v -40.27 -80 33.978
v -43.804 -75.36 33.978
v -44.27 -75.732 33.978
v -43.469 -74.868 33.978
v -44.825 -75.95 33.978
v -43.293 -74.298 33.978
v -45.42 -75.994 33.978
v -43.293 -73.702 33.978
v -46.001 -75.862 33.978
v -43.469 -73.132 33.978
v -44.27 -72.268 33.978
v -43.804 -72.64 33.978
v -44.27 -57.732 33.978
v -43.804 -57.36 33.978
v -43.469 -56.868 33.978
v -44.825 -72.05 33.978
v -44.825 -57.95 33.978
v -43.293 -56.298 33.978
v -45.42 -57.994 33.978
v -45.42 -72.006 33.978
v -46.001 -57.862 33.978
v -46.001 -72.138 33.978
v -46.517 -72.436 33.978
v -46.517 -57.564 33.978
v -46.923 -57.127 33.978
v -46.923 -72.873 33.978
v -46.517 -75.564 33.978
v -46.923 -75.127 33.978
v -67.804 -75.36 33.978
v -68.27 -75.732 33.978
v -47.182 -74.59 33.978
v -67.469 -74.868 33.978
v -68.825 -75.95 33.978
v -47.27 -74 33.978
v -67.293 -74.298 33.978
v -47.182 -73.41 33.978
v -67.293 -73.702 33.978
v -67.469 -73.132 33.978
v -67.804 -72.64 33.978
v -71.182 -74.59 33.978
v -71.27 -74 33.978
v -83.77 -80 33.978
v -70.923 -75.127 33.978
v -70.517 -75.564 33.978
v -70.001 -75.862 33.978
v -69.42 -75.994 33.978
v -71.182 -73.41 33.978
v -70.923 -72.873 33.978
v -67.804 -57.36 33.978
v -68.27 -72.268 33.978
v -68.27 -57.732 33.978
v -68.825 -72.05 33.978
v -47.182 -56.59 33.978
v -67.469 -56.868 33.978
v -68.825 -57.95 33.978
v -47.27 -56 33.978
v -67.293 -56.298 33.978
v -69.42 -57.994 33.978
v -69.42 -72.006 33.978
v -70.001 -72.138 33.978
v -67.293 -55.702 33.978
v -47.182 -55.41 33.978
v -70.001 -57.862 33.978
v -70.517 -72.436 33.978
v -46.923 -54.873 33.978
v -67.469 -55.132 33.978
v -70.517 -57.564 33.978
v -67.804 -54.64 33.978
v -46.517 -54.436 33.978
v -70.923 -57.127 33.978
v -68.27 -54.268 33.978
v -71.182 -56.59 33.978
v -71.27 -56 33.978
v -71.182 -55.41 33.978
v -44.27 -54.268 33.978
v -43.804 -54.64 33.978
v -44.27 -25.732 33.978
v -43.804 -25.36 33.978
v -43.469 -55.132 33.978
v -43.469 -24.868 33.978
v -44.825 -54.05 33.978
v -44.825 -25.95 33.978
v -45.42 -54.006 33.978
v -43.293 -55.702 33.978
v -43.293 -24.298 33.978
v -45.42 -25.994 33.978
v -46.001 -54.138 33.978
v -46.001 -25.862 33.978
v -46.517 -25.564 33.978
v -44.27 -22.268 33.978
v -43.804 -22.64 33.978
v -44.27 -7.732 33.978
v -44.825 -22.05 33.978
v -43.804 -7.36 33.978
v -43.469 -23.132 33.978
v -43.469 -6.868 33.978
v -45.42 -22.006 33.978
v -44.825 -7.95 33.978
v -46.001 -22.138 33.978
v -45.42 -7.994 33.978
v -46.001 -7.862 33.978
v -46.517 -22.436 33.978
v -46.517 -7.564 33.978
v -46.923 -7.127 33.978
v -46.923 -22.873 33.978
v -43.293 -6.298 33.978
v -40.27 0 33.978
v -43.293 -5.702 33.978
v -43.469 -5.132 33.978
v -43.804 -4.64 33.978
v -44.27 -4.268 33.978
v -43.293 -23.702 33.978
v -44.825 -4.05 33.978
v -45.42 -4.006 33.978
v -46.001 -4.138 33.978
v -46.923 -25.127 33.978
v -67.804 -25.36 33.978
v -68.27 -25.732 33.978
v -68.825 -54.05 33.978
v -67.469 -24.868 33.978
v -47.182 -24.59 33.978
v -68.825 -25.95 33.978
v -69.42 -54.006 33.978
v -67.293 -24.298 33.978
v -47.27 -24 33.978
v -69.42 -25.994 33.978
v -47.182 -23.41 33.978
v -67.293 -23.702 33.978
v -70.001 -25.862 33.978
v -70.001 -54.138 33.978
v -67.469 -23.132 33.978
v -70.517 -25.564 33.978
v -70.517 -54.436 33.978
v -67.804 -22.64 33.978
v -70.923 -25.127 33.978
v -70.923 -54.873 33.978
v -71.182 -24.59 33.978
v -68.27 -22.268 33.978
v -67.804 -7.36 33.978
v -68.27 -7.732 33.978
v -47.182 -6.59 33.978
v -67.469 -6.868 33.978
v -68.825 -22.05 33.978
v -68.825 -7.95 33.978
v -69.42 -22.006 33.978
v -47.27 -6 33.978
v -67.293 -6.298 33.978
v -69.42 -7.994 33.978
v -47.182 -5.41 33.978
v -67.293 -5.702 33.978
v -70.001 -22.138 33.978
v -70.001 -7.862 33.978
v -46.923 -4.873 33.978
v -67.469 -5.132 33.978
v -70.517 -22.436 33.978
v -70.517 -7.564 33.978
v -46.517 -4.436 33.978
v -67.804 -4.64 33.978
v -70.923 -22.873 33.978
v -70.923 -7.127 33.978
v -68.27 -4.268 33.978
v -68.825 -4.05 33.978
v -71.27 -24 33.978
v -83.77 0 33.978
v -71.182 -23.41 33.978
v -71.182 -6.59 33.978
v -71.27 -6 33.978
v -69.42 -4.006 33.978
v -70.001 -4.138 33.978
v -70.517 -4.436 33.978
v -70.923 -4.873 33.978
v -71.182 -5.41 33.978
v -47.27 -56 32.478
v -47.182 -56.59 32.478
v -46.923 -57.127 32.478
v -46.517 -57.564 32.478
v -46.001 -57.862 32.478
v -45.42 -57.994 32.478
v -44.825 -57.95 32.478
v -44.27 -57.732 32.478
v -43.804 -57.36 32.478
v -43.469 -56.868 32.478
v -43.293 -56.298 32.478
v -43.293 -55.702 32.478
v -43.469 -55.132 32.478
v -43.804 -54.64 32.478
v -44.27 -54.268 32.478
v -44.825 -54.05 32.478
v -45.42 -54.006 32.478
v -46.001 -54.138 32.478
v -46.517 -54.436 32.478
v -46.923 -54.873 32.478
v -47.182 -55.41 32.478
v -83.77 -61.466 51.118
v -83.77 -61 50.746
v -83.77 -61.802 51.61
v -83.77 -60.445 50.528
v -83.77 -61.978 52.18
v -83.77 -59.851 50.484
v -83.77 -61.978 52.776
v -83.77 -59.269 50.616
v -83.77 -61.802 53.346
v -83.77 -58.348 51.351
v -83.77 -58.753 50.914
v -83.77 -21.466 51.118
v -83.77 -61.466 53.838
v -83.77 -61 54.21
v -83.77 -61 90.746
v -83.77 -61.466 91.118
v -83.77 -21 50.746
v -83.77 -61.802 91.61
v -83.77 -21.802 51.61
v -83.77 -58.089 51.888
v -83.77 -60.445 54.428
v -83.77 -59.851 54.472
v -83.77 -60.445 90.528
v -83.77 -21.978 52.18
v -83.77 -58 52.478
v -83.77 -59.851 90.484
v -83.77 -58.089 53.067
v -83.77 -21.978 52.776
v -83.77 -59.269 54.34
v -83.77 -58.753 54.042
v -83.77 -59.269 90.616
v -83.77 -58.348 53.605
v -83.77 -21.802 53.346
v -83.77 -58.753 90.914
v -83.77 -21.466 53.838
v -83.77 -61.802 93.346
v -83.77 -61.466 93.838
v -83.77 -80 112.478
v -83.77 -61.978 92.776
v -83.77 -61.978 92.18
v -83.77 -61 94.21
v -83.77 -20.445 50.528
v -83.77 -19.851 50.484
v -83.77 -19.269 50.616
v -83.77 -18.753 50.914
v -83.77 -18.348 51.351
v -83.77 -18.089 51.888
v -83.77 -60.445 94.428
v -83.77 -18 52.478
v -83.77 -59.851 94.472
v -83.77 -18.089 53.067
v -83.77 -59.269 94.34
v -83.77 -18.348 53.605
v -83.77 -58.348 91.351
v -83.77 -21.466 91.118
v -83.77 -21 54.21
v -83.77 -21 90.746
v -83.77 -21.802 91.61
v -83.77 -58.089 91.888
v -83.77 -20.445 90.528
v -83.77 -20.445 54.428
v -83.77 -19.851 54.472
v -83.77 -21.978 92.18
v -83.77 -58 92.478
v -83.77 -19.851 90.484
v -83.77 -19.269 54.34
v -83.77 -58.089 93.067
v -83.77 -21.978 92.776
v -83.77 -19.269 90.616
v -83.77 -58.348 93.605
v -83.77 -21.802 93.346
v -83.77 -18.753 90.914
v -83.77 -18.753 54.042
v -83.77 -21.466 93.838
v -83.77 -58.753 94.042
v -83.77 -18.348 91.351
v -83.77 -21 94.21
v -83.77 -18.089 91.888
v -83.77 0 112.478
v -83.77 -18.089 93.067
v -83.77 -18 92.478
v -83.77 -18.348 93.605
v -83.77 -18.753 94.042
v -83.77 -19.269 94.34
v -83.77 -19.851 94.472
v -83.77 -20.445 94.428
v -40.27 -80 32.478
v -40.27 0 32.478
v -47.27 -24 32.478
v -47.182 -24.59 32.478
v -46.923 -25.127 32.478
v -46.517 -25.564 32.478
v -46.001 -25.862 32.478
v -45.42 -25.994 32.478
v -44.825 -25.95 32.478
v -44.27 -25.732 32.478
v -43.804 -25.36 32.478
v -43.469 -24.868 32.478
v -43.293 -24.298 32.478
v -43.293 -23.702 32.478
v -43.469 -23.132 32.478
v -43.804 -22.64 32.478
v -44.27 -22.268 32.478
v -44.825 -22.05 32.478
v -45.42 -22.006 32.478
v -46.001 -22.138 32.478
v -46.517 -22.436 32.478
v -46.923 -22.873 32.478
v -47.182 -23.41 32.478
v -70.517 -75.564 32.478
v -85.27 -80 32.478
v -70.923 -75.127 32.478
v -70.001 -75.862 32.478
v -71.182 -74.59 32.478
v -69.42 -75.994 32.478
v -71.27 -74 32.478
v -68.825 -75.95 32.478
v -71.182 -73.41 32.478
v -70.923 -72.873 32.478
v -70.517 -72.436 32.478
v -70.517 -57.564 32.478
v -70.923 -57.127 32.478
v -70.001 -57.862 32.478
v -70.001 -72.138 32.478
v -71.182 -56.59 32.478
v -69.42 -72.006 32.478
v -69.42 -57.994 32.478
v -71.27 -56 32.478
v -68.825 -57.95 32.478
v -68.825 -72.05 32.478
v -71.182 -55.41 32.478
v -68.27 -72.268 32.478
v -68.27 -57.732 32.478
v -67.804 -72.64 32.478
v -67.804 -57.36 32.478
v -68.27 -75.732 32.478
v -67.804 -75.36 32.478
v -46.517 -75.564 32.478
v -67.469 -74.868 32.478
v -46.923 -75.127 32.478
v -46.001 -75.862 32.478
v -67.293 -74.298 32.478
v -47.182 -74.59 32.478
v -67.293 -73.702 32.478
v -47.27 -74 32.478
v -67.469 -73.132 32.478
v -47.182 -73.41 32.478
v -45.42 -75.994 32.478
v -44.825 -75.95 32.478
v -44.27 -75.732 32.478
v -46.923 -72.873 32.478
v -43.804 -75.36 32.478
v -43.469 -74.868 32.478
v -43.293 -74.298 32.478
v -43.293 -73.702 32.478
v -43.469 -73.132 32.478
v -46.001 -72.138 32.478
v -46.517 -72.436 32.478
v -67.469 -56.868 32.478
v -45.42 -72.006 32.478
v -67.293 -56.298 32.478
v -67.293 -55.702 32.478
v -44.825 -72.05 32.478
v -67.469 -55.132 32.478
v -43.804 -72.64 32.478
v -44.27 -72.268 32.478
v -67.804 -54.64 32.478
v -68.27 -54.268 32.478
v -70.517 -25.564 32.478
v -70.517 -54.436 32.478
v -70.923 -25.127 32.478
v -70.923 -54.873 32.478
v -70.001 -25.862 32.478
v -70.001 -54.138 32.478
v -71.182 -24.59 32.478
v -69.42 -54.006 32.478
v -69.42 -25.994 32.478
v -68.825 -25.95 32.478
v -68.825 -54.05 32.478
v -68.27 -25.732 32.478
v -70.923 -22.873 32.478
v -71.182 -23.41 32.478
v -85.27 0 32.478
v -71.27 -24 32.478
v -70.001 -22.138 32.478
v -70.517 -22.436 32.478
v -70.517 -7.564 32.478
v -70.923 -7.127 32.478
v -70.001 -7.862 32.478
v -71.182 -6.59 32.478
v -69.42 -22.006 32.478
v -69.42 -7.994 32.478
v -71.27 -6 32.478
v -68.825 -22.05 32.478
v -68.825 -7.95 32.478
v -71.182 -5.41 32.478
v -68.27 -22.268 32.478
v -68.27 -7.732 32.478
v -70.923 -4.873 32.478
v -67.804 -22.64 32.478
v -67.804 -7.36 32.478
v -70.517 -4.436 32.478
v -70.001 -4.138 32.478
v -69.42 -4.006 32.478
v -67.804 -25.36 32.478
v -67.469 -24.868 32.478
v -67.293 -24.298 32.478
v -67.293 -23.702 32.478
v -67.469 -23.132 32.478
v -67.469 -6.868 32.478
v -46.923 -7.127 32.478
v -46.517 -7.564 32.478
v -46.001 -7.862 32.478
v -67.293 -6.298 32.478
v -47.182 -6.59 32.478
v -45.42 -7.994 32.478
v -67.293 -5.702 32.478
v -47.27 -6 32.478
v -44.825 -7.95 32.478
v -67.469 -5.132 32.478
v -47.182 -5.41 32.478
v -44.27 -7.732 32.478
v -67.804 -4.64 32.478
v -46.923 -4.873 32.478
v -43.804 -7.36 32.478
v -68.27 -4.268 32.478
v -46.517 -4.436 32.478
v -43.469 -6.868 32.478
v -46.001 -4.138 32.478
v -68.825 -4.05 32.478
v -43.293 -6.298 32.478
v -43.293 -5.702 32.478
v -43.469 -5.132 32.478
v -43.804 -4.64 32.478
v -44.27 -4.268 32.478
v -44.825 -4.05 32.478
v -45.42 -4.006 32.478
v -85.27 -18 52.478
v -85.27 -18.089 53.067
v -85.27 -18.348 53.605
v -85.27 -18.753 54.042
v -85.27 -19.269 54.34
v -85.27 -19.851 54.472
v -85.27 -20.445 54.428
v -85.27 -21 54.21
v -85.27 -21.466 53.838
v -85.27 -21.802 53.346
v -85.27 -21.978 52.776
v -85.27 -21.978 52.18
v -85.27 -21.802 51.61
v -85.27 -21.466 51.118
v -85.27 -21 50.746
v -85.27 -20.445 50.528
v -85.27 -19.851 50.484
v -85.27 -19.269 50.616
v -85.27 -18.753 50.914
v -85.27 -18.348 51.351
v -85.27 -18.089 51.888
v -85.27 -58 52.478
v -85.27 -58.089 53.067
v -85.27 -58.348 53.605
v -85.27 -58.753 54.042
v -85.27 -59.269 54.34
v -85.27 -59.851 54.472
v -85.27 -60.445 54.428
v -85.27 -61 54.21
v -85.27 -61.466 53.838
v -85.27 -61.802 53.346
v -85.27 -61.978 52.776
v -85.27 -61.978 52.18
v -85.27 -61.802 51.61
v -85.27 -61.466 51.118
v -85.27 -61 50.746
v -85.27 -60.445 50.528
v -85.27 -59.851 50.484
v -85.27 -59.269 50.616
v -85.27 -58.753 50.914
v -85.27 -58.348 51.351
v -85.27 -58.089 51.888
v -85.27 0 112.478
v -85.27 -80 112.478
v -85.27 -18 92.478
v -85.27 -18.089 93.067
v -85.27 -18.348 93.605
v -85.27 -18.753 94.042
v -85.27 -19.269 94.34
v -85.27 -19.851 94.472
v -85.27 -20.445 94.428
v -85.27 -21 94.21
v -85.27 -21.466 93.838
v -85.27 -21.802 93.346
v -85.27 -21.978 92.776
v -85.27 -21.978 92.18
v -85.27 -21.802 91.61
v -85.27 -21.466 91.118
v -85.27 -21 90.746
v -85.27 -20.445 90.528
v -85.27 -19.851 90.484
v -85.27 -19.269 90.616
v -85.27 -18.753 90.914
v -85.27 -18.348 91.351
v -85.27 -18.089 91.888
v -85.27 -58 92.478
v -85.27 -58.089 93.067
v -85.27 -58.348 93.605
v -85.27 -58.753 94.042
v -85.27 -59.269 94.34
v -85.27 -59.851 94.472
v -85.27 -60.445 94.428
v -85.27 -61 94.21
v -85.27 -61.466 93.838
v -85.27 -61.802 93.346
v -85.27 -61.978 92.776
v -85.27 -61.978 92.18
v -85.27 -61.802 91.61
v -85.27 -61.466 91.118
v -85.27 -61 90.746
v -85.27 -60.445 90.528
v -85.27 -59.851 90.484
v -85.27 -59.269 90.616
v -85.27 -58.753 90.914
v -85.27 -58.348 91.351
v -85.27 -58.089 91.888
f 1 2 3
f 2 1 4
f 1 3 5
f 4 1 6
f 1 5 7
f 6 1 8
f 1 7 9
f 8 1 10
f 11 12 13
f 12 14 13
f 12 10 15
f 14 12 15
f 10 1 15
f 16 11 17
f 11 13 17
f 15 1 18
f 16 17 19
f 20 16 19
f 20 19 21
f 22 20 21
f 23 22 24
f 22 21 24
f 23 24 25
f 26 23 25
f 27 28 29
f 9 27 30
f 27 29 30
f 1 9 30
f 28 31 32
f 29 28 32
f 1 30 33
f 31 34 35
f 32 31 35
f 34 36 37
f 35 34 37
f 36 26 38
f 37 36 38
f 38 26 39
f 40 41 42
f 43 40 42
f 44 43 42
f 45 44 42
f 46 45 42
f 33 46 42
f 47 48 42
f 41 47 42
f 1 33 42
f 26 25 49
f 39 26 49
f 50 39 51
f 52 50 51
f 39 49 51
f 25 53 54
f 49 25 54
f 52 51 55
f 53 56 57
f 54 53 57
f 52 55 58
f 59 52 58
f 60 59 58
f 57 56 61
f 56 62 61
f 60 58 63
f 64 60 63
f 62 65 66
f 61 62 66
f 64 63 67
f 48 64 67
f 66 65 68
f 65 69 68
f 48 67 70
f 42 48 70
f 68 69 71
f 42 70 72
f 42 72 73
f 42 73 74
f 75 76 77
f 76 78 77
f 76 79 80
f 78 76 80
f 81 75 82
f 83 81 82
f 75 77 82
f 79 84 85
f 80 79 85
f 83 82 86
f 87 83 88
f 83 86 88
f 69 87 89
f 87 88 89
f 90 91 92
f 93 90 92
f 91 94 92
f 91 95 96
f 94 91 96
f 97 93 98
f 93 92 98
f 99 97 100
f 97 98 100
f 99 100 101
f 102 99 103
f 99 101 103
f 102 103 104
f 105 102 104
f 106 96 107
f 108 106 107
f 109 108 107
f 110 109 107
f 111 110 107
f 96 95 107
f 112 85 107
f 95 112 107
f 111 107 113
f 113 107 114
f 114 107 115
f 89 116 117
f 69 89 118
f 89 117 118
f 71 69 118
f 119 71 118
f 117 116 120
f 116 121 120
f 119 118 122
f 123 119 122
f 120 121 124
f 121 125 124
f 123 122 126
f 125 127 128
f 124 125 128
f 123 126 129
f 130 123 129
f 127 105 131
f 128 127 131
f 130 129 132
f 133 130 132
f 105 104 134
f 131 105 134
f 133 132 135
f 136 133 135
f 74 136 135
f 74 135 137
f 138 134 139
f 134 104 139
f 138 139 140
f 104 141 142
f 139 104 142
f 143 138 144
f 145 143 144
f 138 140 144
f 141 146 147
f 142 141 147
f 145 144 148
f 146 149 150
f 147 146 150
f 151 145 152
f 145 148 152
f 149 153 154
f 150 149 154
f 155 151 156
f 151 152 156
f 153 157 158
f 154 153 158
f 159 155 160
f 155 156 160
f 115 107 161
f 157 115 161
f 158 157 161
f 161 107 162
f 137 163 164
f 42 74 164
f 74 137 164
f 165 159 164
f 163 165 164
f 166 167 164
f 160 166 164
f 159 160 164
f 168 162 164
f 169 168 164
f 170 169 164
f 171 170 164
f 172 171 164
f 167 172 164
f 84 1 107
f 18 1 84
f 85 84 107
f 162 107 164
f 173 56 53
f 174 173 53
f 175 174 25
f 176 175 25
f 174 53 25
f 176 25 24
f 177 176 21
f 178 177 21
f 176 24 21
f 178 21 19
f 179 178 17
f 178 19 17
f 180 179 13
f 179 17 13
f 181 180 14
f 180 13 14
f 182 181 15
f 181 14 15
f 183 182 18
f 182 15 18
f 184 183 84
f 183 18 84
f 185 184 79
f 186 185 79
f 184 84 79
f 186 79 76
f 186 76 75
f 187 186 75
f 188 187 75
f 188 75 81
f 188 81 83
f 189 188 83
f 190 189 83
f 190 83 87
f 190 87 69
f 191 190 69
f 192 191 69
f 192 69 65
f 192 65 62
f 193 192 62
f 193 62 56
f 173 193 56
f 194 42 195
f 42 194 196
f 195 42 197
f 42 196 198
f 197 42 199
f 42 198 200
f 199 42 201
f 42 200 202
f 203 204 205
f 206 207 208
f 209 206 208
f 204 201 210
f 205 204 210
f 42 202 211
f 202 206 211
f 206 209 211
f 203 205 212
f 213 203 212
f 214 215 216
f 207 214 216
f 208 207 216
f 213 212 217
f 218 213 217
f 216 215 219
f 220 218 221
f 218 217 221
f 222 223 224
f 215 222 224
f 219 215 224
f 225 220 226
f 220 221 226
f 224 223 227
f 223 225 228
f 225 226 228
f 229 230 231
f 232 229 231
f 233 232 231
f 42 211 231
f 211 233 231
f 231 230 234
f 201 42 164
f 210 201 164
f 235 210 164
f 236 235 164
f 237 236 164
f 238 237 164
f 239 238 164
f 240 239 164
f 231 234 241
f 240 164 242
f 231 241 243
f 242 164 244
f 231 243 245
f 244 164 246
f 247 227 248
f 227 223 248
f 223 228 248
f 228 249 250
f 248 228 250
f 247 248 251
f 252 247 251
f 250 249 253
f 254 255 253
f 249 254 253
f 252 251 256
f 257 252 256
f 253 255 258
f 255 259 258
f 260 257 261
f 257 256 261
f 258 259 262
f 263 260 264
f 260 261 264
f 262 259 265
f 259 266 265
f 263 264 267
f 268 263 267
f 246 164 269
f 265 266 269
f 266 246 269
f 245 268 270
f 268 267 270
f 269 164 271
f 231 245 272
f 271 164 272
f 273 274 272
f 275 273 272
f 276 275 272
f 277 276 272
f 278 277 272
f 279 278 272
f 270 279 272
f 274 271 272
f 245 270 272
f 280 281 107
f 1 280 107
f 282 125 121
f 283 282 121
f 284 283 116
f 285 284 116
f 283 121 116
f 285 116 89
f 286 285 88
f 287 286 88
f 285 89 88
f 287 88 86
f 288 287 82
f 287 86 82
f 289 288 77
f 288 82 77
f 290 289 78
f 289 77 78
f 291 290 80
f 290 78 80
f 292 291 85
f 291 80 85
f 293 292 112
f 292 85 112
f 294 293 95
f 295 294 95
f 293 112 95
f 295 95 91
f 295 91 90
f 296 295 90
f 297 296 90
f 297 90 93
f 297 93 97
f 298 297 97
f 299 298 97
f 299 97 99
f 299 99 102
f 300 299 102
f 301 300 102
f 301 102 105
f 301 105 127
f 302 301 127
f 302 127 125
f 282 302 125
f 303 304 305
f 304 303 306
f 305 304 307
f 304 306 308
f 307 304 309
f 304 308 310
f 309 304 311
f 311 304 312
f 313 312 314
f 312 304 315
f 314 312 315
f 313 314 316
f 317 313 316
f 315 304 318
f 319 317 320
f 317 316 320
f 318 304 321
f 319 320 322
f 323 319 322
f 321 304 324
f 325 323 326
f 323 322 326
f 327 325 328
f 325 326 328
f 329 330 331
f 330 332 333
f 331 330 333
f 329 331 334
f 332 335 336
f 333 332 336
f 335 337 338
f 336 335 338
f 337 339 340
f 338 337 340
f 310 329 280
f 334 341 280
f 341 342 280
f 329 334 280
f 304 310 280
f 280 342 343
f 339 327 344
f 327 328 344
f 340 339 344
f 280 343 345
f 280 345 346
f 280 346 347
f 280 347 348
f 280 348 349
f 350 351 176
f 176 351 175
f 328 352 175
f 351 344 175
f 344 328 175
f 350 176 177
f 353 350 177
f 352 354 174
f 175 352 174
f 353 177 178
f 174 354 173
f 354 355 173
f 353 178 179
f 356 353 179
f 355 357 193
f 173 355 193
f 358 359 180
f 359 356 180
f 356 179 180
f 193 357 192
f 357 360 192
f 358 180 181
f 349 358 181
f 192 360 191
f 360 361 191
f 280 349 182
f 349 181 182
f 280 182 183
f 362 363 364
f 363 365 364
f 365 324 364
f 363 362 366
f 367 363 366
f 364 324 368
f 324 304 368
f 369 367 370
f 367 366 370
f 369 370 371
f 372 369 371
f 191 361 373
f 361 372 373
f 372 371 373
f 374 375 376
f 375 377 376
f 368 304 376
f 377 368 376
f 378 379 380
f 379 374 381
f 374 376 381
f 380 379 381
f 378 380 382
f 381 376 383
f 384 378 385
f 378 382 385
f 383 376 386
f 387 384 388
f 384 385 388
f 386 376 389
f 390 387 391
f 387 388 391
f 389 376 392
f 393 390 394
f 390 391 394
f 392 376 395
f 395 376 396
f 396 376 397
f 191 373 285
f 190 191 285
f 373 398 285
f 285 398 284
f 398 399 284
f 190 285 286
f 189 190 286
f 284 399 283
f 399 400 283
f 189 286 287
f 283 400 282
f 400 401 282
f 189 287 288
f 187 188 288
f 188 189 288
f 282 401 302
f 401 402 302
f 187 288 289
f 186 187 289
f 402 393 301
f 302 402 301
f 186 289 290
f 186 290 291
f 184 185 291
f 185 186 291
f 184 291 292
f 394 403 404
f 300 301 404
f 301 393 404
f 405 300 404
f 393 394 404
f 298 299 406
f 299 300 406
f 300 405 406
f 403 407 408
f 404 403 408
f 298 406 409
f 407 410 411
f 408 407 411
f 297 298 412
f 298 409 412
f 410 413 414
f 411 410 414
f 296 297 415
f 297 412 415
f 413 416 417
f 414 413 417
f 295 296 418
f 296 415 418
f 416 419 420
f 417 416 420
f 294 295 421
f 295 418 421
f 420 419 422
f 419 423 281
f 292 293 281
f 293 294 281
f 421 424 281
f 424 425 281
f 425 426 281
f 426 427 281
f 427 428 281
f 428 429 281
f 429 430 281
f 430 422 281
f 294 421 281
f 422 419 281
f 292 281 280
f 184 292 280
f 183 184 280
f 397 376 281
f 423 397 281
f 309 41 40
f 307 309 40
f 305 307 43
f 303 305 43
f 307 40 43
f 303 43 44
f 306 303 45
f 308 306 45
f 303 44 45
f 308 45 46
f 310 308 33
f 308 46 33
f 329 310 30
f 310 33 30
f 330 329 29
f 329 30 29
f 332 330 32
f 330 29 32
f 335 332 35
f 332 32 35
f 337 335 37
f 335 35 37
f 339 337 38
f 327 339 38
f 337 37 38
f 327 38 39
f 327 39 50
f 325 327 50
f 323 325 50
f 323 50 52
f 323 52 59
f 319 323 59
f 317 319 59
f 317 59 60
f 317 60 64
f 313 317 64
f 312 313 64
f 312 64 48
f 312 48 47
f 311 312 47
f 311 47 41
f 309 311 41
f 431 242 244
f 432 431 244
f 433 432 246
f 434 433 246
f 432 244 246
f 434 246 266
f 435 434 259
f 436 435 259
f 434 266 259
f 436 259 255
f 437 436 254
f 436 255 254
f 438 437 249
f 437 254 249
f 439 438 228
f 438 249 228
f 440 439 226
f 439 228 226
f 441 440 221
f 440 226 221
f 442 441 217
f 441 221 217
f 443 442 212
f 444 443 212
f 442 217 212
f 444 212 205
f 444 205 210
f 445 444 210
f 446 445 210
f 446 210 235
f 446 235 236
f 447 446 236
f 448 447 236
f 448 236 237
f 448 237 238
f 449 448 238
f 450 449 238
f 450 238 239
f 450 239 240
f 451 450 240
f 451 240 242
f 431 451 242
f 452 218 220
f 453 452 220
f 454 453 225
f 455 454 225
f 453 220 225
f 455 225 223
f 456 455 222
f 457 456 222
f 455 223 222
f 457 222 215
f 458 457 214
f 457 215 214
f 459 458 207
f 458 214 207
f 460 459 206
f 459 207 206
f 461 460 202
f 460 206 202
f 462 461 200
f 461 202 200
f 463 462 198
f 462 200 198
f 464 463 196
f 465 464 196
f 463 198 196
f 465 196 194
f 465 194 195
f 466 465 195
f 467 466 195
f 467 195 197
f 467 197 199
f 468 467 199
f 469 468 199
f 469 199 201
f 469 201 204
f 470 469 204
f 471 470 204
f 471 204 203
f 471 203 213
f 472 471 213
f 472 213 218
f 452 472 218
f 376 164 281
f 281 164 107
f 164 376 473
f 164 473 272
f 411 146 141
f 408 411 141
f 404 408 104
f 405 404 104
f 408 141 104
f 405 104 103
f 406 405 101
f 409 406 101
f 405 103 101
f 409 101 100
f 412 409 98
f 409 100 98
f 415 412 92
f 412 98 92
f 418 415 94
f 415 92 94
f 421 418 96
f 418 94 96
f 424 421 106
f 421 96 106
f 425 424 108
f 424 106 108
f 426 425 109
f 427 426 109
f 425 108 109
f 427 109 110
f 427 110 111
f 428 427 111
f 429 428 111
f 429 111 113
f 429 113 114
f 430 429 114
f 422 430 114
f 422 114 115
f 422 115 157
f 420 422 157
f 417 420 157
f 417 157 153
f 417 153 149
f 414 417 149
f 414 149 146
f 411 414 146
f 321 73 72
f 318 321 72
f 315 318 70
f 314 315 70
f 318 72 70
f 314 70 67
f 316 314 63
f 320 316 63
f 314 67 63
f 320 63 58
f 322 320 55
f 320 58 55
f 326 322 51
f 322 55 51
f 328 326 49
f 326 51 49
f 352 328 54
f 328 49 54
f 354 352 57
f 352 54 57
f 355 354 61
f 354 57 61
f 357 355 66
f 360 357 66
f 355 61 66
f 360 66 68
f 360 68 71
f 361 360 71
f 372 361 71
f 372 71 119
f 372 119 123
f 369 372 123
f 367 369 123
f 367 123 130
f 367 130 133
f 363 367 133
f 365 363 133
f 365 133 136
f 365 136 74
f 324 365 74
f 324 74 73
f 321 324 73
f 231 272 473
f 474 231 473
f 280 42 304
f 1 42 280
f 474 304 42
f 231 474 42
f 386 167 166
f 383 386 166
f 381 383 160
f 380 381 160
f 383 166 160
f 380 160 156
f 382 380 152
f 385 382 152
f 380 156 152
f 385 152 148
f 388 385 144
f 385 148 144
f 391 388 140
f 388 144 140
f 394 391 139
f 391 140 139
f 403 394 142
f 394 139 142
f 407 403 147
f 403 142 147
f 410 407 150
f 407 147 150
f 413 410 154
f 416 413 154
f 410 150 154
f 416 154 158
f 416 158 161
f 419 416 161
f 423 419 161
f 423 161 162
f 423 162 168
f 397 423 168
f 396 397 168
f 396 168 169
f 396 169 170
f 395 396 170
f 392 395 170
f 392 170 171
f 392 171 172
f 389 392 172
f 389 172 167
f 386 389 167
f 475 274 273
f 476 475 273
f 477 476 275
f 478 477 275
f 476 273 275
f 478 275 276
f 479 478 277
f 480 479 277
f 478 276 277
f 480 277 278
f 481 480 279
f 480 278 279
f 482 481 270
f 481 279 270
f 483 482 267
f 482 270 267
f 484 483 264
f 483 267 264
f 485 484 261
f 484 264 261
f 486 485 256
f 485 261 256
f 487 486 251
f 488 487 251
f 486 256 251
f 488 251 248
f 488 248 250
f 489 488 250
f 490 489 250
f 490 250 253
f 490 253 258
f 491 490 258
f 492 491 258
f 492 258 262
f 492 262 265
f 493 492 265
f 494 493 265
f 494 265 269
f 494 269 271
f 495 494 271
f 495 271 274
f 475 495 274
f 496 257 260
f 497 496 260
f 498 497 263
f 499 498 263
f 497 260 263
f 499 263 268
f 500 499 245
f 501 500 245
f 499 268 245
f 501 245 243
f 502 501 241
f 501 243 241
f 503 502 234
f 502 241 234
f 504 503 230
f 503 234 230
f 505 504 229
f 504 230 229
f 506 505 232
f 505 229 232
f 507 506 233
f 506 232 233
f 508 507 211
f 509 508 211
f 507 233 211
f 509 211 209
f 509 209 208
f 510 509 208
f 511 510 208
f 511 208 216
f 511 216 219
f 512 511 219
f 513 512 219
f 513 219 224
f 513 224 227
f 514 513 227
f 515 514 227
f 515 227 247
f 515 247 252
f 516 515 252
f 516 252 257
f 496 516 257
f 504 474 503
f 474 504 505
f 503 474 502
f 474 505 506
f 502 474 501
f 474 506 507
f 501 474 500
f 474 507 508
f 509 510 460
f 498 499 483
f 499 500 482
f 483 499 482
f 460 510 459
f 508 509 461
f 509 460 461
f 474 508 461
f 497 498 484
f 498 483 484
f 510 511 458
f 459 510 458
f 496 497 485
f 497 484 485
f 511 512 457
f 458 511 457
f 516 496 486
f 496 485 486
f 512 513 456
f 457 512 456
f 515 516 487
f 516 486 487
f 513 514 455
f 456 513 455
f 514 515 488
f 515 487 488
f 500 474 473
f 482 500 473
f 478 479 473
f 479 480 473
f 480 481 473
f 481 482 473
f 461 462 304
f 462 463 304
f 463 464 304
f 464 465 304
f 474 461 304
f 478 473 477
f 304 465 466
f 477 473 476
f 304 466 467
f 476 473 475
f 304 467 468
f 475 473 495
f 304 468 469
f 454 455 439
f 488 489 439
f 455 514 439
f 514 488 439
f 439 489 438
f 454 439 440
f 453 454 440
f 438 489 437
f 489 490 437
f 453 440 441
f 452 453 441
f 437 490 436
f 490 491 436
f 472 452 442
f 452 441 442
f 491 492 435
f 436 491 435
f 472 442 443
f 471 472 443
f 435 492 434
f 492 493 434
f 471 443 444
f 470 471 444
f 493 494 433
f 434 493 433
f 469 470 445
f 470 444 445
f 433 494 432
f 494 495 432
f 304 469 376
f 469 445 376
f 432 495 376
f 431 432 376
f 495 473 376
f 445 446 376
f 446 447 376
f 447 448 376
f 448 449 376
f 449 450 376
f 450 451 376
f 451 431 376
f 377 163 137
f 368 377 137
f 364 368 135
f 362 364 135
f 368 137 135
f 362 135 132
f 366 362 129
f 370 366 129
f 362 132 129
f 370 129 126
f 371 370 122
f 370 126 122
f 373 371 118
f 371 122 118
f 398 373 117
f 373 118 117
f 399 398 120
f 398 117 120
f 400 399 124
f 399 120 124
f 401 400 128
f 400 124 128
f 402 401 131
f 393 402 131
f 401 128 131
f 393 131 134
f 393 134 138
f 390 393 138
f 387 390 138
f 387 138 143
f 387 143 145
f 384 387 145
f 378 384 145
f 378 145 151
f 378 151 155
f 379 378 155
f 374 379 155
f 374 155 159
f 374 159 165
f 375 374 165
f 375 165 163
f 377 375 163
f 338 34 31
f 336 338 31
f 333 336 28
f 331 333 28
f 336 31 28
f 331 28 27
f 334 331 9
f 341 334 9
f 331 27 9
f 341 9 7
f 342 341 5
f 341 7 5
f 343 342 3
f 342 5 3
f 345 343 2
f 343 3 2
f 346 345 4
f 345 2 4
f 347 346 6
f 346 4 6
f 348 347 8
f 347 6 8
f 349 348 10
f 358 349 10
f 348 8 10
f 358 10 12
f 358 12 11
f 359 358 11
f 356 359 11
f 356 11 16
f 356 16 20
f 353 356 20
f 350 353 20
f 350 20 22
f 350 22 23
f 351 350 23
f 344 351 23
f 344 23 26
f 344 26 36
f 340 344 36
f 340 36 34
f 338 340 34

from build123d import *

# Parameters (mm, degrees)
F1_DEPTH = 80
F3_D     = 4
F5_D     = 4


with BuildPart() as f1:
    # F0 (on Front) → F1 (new body)
    with BuildSketch(Plane.XZ):
        Polygon((-83.770444, 112.477971), (-85.270444, 112.477971), (-85.270444, 32.477971), (-40.270444, 32.477971), (-40.270444, 33.977971), (-83.770444, 33.977971), align=None)
    extrude(amount=F1_DEPTH)

    # F3 (through all)
    with Locations(Plane(origin=(0, 0, 32.477971), x_dir=(1, 0, 0), z_dir=(0, 0, -1))):
        with Locations((-45.270444, 74), (-69.270444, 74), (-69.270444, 56), (-45.270444, 56), (-45.270444, 24), (-45.270444, 6), (-69.270444, 6), (-69.270444, 24)):
            Hole(F3_D / 2)

    # F5 (through all)
    with Locations(Plane(origin=(-85.270444, 0, 0), x_dir=(0, -1, 0), z_dir=(-1, 0, 0))):
        with Locations((20, 52.477971), (60, 52.477971), (60, 92.477971), (20, 92.477971)):
            Hole(F5_D / 2)


solid = f1.part
